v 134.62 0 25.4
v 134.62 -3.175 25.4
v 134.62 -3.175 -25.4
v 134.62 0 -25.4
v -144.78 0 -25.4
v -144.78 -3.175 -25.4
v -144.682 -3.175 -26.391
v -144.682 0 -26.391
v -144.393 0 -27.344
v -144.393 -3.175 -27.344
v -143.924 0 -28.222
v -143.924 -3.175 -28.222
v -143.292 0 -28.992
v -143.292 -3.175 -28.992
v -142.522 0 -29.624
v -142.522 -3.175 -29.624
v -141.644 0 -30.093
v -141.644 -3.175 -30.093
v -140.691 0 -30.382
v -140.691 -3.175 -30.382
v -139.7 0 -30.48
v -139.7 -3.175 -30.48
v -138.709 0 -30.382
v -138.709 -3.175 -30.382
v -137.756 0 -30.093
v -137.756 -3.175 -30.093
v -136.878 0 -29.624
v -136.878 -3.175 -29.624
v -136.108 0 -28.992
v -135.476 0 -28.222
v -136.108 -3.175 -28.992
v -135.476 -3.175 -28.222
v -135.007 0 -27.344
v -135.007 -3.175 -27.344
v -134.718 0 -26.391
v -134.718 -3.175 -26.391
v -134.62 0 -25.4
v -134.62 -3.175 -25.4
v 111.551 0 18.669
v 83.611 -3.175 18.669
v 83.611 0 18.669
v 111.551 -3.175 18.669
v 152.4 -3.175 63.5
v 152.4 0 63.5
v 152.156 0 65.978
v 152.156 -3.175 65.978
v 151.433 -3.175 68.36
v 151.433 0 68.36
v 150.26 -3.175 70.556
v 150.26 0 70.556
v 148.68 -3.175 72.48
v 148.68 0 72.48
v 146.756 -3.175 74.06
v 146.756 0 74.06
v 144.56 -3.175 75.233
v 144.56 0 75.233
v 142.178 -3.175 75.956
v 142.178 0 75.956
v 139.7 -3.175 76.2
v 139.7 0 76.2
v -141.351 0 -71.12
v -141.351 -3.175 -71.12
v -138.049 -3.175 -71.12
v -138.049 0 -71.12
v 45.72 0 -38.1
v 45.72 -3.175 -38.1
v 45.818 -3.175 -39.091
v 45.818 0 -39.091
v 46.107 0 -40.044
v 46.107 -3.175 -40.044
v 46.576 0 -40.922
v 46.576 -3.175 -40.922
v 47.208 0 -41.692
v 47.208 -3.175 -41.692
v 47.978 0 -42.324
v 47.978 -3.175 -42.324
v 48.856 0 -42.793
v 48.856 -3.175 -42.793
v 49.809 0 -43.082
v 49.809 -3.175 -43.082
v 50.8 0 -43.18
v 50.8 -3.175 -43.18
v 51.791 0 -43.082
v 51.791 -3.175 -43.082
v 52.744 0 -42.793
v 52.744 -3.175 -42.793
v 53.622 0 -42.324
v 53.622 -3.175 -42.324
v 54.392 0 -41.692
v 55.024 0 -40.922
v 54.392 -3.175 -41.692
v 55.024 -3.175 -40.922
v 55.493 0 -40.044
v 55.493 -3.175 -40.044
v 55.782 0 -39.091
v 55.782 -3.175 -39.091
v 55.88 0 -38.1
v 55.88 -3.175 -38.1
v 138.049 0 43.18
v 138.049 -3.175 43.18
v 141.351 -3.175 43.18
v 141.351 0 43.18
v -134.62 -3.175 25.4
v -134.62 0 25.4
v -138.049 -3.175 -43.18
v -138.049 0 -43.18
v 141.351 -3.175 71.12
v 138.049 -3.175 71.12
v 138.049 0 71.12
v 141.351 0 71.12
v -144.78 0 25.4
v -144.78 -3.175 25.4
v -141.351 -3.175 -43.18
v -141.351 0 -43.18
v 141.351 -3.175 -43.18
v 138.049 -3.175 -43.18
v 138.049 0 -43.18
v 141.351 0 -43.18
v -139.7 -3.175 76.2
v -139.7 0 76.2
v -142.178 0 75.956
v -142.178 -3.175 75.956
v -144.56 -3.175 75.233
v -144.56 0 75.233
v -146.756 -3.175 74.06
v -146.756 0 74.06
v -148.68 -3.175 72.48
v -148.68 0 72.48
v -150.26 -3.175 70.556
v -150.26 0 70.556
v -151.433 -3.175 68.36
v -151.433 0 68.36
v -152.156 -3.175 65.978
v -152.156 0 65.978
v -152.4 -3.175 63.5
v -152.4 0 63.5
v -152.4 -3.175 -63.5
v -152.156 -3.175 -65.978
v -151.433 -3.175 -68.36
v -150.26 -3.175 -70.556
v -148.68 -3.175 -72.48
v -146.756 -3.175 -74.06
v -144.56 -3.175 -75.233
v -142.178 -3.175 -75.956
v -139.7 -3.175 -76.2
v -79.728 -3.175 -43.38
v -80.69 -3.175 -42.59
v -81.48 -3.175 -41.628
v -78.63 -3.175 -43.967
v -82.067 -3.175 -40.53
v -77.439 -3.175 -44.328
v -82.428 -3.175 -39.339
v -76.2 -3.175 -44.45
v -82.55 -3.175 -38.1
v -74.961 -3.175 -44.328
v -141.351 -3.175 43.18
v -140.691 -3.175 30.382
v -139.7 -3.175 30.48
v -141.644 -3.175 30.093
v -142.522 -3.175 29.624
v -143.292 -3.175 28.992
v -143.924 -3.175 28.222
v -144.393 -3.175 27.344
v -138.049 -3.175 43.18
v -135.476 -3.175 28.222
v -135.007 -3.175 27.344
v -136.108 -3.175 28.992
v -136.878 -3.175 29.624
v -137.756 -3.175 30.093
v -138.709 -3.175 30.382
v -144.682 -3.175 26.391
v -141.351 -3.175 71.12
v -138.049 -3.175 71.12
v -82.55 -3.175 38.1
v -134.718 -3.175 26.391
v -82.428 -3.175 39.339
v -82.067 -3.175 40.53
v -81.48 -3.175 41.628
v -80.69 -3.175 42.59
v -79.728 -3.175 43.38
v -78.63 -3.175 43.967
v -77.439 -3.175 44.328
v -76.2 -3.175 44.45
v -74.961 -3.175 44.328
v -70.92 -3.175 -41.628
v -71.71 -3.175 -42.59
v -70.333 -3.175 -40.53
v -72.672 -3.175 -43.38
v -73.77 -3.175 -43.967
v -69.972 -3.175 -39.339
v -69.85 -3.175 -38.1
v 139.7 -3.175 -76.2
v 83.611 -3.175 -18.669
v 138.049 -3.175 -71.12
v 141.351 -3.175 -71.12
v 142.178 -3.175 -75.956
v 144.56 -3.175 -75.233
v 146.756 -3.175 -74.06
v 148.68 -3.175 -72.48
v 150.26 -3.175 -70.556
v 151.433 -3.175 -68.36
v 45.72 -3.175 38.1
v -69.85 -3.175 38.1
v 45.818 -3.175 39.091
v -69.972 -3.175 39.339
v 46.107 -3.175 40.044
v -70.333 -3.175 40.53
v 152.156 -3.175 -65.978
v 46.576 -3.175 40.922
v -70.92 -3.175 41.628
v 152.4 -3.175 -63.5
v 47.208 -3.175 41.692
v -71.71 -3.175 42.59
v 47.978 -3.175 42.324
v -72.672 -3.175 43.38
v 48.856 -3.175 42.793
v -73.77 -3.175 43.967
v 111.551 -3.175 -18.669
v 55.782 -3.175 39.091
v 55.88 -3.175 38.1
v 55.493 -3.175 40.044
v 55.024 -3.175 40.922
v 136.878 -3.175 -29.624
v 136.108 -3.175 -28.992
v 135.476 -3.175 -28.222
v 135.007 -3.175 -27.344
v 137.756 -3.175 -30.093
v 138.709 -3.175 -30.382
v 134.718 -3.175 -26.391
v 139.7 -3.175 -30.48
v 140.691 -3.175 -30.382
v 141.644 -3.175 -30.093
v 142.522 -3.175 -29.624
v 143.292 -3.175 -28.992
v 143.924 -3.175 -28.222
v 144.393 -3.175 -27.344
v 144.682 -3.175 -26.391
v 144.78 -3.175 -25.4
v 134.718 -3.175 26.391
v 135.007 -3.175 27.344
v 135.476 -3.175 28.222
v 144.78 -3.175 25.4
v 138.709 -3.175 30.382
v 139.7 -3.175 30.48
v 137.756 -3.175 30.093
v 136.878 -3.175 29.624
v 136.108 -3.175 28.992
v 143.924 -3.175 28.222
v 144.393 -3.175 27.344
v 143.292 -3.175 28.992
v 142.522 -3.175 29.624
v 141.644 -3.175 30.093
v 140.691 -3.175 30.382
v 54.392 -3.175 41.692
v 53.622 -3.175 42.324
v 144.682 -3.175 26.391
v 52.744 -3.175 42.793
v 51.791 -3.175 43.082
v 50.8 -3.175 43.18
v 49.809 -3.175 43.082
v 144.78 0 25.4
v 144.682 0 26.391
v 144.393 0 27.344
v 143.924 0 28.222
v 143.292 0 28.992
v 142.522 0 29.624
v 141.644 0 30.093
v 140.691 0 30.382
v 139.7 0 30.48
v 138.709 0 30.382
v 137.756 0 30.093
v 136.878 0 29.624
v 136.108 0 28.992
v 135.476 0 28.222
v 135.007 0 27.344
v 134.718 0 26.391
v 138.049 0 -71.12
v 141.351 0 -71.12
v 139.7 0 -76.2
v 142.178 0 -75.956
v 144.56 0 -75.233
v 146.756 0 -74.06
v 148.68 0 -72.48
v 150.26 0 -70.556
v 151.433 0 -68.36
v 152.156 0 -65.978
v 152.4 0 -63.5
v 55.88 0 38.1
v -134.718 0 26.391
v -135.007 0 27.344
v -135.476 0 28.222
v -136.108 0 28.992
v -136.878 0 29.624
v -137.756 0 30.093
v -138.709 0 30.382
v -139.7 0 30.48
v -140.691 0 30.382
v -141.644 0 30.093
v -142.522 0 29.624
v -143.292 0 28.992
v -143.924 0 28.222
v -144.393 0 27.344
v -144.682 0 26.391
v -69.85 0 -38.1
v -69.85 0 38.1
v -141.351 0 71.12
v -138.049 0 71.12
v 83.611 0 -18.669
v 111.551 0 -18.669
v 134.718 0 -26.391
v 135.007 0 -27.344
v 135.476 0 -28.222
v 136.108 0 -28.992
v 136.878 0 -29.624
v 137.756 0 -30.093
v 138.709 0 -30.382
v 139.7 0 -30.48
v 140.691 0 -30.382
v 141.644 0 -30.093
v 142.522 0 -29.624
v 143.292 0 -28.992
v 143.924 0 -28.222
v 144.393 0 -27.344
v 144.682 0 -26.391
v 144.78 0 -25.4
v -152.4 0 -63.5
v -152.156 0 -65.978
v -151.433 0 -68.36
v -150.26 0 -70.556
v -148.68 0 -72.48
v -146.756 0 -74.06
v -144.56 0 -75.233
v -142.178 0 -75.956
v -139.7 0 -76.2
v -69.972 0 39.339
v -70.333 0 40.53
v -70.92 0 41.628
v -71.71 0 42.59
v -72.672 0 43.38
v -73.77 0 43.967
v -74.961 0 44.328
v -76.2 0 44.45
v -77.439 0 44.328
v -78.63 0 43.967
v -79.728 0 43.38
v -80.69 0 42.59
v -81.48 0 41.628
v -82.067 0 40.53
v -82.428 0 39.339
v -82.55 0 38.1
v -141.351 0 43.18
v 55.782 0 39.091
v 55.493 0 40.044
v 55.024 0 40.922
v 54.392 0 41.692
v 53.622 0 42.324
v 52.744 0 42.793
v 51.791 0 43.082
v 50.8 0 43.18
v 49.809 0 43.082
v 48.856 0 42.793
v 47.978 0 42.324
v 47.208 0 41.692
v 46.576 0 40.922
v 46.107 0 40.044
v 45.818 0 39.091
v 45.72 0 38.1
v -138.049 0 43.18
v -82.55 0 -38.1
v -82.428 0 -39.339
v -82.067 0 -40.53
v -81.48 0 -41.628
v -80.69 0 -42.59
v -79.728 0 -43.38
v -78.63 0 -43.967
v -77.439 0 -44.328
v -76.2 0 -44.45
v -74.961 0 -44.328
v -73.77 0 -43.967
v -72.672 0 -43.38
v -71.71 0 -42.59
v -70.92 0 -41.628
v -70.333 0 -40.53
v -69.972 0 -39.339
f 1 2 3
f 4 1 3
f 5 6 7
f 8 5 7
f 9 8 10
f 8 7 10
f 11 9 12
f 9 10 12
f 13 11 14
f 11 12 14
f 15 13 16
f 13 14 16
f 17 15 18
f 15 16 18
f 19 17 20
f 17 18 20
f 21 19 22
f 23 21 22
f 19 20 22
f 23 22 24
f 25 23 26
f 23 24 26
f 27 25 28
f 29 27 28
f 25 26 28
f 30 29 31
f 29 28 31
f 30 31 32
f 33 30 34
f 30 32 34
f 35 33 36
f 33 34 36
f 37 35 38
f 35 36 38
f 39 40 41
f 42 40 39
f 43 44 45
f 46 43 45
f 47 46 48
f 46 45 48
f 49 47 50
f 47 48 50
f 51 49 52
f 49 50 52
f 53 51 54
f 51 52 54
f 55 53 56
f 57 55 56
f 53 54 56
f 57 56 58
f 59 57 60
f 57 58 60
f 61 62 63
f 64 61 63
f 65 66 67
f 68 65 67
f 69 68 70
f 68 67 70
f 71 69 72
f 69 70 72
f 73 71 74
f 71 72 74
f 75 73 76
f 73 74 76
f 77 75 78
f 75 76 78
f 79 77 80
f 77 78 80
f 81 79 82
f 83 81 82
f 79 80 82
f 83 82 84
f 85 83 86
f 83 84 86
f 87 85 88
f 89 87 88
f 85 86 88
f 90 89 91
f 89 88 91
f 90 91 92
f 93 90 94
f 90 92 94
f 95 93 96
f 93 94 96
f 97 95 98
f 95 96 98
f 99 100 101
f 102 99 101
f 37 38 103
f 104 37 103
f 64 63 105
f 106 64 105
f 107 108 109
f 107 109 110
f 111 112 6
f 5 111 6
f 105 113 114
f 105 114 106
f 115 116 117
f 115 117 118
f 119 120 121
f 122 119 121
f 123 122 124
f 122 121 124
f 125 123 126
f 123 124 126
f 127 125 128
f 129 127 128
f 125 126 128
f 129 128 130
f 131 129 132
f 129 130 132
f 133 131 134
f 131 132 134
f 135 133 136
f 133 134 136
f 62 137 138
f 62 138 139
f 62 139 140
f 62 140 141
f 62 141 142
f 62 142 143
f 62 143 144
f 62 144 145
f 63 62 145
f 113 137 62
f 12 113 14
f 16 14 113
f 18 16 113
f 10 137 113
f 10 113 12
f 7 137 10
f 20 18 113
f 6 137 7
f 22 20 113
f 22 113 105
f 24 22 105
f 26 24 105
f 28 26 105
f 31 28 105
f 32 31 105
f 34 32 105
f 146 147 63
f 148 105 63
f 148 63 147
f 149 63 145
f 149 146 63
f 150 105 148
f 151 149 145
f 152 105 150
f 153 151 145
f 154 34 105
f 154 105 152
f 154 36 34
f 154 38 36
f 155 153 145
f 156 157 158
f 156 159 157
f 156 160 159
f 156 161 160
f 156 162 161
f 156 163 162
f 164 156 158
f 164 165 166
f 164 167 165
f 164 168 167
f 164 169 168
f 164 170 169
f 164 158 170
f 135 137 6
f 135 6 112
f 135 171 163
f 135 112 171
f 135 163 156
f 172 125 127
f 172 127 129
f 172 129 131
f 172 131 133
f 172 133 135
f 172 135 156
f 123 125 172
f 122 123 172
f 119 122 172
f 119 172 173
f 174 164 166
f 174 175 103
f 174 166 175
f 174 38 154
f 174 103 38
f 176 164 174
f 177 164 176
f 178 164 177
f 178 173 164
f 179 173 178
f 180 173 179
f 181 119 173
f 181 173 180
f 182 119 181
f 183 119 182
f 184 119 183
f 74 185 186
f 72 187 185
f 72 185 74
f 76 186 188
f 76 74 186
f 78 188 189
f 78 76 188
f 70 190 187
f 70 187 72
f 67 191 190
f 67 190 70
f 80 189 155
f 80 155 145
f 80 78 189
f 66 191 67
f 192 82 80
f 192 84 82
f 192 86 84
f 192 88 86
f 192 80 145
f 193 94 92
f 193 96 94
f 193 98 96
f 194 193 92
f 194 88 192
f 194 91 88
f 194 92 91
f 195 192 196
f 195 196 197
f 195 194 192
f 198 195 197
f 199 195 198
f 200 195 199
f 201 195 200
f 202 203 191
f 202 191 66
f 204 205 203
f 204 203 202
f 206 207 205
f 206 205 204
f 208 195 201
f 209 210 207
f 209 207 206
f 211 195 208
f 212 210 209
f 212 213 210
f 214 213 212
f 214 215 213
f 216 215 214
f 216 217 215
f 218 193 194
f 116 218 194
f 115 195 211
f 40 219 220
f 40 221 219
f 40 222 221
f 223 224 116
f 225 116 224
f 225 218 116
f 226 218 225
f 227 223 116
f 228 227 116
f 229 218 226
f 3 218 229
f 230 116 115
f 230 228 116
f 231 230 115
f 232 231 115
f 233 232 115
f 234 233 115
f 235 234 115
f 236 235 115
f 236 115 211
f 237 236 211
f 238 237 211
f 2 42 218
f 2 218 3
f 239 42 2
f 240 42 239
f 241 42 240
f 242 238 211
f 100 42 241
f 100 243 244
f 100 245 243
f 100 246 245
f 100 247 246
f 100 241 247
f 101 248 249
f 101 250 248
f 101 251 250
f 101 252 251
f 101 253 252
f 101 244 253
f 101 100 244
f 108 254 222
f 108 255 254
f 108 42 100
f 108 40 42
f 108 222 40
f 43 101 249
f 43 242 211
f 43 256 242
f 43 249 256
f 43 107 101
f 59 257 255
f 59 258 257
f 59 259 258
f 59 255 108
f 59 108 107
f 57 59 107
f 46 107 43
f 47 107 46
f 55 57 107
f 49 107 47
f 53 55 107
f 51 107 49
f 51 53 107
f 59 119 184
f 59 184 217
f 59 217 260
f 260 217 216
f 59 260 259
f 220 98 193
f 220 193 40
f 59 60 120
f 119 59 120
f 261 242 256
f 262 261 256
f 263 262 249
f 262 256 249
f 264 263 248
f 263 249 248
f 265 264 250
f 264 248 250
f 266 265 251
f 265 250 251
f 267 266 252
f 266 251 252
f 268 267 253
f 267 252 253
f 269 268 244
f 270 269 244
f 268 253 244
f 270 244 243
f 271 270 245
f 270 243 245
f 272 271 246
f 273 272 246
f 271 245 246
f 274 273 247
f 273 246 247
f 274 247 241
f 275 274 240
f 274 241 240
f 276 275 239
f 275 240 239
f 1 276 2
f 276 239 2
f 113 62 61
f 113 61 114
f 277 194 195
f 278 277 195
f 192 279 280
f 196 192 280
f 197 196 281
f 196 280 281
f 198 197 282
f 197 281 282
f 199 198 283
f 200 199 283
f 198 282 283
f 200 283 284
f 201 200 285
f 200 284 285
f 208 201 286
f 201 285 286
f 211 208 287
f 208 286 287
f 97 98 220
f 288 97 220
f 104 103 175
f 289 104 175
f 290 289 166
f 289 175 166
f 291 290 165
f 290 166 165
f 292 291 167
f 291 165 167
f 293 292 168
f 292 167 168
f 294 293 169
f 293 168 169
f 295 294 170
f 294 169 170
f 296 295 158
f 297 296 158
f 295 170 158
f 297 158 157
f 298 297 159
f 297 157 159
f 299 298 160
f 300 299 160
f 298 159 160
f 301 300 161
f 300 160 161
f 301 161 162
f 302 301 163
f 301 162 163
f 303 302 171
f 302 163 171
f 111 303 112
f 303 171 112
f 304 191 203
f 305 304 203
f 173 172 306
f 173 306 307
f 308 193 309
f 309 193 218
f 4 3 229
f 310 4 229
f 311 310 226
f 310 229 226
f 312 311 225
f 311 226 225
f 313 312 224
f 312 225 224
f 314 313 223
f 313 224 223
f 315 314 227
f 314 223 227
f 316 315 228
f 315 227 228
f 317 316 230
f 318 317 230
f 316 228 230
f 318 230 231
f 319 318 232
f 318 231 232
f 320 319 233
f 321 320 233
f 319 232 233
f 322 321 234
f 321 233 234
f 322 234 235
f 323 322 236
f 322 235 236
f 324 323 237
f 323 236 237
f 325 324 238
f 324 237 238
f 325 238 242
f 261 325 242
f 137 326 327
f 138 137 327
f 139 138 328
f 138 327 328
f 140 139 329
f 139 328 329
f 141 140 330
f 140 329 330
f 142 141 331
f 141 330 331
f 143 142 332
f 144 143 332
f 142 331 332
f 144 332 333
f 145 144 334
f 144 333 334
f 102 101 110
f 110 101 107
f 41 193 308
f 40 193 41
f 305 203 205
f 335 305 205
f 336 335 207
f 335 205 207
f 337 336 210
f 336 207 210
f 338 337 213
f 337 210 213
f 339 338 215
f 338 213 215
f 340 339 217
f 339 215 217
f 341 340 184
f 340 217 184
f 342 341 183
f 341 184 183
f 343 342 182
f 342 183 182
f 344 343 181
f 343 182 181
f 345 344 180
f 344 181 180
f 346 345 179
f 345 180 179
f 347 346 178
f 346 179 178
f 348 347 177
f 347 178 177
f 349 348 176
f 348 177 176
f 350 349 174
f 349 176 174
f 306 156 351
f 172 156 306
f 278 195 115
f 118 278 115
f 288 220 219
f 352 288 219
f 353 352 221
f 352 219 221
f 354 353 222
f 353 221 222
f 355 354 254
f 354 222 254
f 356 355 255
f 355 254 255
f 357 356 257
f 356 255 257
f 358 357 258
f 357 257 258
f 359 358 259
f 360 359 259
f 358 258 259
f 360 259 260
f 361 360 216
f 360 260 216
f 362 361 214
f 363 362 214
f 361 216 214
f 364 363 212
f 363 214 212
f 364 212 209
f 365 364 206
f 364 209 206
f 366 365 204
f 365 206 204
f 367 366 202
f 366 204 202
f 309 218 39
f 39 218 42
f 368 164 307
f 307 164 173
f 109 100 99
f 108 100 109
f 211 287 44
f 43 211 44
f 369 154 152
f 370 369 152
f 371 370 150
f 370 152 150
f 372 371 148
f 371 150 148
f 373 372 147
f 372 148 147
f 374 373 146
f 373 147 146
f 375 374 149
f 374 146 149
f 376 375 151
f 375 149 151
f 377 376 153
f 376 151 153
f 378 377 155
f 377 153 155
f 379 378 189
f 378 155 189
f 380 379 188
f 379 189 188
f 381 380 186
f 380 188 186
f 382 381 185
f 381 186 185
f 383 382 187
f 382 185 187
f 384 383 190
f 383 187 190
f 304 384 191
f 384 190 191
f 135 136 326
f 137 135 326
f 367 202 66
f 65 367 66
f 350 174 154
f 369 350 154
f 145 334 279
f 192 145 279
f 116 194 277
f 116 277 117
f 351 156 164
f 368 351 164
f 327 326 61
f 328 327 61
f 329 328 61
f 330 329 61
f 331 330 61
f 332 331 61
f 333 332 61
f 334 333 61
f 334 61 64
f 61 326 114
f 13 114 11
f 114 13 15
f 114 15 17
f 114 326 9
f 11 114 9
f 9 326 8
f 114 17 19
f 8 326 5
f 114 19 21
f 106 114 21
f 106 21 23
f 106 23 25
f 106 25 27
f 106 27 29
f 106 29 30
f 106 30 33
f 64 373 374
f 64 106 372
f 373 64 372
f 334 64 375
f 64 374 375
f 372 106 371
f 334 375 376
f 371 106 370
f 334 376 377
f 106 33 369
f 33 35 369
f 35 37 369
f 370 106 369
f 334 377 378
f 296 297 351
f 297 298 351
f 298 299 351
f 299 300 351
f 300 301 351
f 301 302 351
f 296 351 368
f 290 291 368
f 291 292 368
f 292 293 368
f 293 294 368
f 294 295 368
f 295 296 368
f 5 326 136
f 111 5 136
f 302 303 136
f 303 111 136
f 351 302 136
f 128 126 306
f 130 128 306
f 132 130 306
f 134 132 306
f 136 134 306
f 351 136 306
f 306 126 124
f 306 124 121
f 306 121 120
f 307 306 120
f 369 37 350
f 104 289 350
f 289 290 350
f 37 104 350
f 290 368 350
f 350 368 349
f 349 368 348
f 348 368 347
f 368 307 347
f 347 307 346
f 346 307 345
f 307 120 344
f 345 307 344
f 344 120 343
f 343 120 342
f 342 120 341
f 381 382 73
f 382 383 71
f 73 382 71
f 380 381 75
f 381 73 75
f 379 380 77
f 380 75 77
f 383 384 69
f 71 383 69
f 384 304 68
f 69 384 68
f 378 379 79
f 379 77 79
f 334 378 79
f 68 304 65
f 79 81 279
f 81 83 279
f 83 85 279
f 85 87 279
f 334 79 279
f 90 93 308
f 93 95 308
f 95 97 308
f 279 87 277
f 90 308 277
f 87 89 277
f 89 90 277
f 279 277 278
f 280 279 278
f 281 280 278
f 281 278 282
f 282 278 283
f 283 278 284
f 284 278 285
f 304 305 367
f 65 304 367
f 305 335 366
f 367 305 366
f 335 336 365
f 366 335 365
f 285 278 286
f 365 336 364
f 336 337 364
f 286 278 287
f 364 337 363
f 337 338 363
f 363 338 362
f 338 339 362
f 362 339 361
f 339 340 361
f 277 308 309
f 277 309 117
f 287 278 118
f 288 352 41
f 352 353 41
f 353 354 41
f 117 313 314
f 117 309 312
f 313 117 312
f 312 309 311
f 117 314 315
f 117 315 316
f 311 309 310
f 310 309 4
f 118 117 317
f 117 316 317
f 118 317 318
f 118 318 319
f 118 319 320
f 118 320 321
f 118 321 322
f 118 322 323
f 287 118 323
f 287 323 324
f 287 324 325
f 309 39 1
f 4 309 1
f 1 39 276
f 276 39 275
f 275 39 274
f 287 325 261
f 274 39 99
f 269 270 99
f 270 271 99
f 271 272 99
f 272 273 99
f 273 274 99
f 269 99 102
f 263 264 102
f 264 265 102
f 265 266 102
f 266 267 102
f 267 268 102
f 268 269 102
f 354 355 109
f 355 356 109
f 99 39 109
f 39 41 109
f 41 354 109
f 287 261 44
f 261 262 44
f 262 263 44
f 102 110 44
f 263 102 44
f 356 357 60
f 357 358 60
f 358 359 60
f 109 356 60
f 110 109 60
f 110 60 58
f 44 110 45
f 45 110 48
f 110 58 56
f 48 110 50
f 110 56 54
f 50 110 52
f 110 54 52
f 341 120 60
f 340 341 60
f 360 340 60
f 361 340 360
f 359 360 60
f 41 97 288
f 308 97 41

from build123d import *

# Parameters (mm, degrees)
F1_DEPTH = 3.175
F2_W     = 27.94
F2_H     = 37.338
F2_W_2   = 3.302
F2_H_2   = 27.94
F3_DEPTH = 25.4


with BuildPart() as f1:
    # F0 (on Front) → F1 (new body)
    with BuildSketch(Plane.XZ):
        with BuildLine():
            ThreePointArc((152.4, 63.5), (148.680256, 72.480256), (139.7, 76.2))
            Line((139.7, 76.2), (-139.7, 76.2))
            ThreePointArc((-139.7, 76.2), (-148.680256, 72.480256), (-152.4, 63.5))
            Line((-152.4, 63.5), (-152.4, -63.5))
            ThreePointArc((-152.4, -63.5), (-148.680256, -72.480256), (-139.7, -76.2))
            Line((-139.7, -76.2), (139.7, -76.2))
            ThreePointArc((139.7, -76.2), (148.680256, -72.480256), (152.4, -63.5))
            Line((152.4, -63.5), (152.4, 63.5))
        make_face()
    extrude(amount=F1_DEPTH)

    # F2 (on face) → F3 (cut)
    with BuildSketch(Plane.XZ.offset(3.175)):
        with BuildLine():
            ThreePointArc((-144.78, -25.4), (-139.7, -30.48), (-134.62, -25.4))
            Line((-134.62, -25.4), (-134.62, 0))
            Line((-134.62, 0), (-134.62, 25.4))
            ThreePointArc((-134.62, 25.4), (-139.7, 30.48), (-144.78, 25.4))
            Line((-144.78, 25.4), (-144.78, 0))
            Line((-144.78, 0), (-144.78, -25.4))
        make_face()
        with BuildLine():
            ThreePointArc((55.88, 38.1), (50.8, 43.18), (45.72, 38.1))
            Line((45.72, 38.1), (45.72, 0))
            Line((45.72, 0), (45.72, -38.1))
            ThreePointArc((45.72, -38.1), (50.8, -43.18), (55.88, -38.1))
            Line((55.88, -38.1), (55.88, 0))
            Line((55.88, 0), (55.88, 38.1))
        make_face()
        with Locations((97.580589, 0)):
            Rectangle(F2_W, F2_H)
        with Locations((-139.7, 57.15)):
            Rectangle(F2_W_2, F2_H_2)
        with Locations((-139.7, -57.15)):
            Rectangle(F2_W_2, F2_H_2)
        with Locations((139.7, 57.15)):
            Rectangle(F2_W_2, F2_H_2)
        with Locations((139.7, -57.15)):
            Rectangle(F2_W_2, F2_H_2)
        with BuildLine():
            Line((134.62, 25.4), (134.62, 0))
            Line((134.62, 0), (134.62, -25.4))
            ThreePointArc((134.62, -25.4), (139.7, -30.48), (144.78, -25.4))
            Line((144.78, -25.4), (144.78, 0))
            Line((144.78, 0), (144.78, 25.4))
            ThreePointArc((144.78, 25.4), (139.7, 30.48), (134.62, 25.4))
        make_face()
        with BuildLine():
            ThreePointArc((-69.85, 38.1), (-76.2, 44.45), (-82.55, 38.1))
            Line((-82.55, 38.1), (-82.55, 0))
            Line((-82.55, 0), (-82.55, -38.1))
            ThreePointArc((-82.55, -38.1), (-76.2, -44.45), (-69.85, -38.1))
            Line((-69.85, -38.1), (-69.85, 0))
            Line((-69.85, 0), (-69.85, 38.1))
        make_face()
    extrude(amount=-F3_DEPTH, mode=Mode.SUBTRACT)


with BuildPart() as f4_1:
    # F4: copy of F1
    add(f1.part)


solid = f1.part
